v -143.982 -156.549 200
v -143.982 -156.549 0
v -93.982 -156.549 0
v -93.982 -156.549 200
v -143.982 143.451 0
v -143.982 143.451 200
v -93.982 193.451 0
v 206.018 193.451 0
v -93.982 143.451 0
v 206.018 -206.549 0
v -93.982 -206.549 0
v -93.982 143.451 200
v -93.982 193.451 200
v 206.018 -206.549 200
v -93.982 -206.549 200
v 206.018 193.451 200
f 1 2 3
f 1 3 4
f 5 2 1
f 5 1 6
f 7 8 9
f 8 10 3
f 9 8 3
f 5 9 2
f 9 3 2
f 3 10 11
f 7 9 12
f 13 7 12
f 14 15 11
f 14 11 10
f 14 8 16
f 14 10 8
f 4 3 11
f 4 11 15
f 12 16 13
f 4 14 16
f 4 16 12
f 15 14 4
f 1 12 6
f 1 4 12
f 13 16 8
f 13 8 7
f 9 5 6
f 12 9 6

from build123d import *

# Parameters (mm, degrees)
F0_W     = 300
F0_H     = 300
F1_DEPTH = 200
F2_W     = 300
F2_H     = 200
F3_DEPTH = 50
F4_W     = 300
F4_H     = 200
F5_DEPTH = 50
F6_W     = 300
F6_H     = 200
F7_DEPTH = 50


with BuildPart() as f1:
    # F0 (on Top) → F1 (new body)
    with BuildSketch(Plane.XY):
        with Locations((6.017694, -6.54919)):
            Rectangle(F0_W, F0_H)
    extrude(amount=F1_DEPTH)

    # F2 (on face) → F3 (join)
    with BuildSketch(Plane.YZ.offset(156.017694)):
        with Locations((-6.54919, 100)):
            Rectangle(F2_W, F2_H)
    extrude(amount=F3_DEPTH)

    # F4 (on face) → F5 (join)
    with BuildSketch(Plane.XZ.offset(156.54919)):
        with Locations((56.017694, 100)):
            Rectangle(F4_W, F4_H)
    extrude(amount=F5_DEPTH)

    # F6 (on face) → F7 (join)
    with BuildSketch(Plane(origin=(0, 143.45081, 0), x_dir=(-1, 0, 0), z_dir=(0, 1, 0))):
        with Locations((-56.017694, 100)):
            Rectangle(F6_W, F6_H)
    extrude(amount=F7_DEPTH)


solid = f1.part
